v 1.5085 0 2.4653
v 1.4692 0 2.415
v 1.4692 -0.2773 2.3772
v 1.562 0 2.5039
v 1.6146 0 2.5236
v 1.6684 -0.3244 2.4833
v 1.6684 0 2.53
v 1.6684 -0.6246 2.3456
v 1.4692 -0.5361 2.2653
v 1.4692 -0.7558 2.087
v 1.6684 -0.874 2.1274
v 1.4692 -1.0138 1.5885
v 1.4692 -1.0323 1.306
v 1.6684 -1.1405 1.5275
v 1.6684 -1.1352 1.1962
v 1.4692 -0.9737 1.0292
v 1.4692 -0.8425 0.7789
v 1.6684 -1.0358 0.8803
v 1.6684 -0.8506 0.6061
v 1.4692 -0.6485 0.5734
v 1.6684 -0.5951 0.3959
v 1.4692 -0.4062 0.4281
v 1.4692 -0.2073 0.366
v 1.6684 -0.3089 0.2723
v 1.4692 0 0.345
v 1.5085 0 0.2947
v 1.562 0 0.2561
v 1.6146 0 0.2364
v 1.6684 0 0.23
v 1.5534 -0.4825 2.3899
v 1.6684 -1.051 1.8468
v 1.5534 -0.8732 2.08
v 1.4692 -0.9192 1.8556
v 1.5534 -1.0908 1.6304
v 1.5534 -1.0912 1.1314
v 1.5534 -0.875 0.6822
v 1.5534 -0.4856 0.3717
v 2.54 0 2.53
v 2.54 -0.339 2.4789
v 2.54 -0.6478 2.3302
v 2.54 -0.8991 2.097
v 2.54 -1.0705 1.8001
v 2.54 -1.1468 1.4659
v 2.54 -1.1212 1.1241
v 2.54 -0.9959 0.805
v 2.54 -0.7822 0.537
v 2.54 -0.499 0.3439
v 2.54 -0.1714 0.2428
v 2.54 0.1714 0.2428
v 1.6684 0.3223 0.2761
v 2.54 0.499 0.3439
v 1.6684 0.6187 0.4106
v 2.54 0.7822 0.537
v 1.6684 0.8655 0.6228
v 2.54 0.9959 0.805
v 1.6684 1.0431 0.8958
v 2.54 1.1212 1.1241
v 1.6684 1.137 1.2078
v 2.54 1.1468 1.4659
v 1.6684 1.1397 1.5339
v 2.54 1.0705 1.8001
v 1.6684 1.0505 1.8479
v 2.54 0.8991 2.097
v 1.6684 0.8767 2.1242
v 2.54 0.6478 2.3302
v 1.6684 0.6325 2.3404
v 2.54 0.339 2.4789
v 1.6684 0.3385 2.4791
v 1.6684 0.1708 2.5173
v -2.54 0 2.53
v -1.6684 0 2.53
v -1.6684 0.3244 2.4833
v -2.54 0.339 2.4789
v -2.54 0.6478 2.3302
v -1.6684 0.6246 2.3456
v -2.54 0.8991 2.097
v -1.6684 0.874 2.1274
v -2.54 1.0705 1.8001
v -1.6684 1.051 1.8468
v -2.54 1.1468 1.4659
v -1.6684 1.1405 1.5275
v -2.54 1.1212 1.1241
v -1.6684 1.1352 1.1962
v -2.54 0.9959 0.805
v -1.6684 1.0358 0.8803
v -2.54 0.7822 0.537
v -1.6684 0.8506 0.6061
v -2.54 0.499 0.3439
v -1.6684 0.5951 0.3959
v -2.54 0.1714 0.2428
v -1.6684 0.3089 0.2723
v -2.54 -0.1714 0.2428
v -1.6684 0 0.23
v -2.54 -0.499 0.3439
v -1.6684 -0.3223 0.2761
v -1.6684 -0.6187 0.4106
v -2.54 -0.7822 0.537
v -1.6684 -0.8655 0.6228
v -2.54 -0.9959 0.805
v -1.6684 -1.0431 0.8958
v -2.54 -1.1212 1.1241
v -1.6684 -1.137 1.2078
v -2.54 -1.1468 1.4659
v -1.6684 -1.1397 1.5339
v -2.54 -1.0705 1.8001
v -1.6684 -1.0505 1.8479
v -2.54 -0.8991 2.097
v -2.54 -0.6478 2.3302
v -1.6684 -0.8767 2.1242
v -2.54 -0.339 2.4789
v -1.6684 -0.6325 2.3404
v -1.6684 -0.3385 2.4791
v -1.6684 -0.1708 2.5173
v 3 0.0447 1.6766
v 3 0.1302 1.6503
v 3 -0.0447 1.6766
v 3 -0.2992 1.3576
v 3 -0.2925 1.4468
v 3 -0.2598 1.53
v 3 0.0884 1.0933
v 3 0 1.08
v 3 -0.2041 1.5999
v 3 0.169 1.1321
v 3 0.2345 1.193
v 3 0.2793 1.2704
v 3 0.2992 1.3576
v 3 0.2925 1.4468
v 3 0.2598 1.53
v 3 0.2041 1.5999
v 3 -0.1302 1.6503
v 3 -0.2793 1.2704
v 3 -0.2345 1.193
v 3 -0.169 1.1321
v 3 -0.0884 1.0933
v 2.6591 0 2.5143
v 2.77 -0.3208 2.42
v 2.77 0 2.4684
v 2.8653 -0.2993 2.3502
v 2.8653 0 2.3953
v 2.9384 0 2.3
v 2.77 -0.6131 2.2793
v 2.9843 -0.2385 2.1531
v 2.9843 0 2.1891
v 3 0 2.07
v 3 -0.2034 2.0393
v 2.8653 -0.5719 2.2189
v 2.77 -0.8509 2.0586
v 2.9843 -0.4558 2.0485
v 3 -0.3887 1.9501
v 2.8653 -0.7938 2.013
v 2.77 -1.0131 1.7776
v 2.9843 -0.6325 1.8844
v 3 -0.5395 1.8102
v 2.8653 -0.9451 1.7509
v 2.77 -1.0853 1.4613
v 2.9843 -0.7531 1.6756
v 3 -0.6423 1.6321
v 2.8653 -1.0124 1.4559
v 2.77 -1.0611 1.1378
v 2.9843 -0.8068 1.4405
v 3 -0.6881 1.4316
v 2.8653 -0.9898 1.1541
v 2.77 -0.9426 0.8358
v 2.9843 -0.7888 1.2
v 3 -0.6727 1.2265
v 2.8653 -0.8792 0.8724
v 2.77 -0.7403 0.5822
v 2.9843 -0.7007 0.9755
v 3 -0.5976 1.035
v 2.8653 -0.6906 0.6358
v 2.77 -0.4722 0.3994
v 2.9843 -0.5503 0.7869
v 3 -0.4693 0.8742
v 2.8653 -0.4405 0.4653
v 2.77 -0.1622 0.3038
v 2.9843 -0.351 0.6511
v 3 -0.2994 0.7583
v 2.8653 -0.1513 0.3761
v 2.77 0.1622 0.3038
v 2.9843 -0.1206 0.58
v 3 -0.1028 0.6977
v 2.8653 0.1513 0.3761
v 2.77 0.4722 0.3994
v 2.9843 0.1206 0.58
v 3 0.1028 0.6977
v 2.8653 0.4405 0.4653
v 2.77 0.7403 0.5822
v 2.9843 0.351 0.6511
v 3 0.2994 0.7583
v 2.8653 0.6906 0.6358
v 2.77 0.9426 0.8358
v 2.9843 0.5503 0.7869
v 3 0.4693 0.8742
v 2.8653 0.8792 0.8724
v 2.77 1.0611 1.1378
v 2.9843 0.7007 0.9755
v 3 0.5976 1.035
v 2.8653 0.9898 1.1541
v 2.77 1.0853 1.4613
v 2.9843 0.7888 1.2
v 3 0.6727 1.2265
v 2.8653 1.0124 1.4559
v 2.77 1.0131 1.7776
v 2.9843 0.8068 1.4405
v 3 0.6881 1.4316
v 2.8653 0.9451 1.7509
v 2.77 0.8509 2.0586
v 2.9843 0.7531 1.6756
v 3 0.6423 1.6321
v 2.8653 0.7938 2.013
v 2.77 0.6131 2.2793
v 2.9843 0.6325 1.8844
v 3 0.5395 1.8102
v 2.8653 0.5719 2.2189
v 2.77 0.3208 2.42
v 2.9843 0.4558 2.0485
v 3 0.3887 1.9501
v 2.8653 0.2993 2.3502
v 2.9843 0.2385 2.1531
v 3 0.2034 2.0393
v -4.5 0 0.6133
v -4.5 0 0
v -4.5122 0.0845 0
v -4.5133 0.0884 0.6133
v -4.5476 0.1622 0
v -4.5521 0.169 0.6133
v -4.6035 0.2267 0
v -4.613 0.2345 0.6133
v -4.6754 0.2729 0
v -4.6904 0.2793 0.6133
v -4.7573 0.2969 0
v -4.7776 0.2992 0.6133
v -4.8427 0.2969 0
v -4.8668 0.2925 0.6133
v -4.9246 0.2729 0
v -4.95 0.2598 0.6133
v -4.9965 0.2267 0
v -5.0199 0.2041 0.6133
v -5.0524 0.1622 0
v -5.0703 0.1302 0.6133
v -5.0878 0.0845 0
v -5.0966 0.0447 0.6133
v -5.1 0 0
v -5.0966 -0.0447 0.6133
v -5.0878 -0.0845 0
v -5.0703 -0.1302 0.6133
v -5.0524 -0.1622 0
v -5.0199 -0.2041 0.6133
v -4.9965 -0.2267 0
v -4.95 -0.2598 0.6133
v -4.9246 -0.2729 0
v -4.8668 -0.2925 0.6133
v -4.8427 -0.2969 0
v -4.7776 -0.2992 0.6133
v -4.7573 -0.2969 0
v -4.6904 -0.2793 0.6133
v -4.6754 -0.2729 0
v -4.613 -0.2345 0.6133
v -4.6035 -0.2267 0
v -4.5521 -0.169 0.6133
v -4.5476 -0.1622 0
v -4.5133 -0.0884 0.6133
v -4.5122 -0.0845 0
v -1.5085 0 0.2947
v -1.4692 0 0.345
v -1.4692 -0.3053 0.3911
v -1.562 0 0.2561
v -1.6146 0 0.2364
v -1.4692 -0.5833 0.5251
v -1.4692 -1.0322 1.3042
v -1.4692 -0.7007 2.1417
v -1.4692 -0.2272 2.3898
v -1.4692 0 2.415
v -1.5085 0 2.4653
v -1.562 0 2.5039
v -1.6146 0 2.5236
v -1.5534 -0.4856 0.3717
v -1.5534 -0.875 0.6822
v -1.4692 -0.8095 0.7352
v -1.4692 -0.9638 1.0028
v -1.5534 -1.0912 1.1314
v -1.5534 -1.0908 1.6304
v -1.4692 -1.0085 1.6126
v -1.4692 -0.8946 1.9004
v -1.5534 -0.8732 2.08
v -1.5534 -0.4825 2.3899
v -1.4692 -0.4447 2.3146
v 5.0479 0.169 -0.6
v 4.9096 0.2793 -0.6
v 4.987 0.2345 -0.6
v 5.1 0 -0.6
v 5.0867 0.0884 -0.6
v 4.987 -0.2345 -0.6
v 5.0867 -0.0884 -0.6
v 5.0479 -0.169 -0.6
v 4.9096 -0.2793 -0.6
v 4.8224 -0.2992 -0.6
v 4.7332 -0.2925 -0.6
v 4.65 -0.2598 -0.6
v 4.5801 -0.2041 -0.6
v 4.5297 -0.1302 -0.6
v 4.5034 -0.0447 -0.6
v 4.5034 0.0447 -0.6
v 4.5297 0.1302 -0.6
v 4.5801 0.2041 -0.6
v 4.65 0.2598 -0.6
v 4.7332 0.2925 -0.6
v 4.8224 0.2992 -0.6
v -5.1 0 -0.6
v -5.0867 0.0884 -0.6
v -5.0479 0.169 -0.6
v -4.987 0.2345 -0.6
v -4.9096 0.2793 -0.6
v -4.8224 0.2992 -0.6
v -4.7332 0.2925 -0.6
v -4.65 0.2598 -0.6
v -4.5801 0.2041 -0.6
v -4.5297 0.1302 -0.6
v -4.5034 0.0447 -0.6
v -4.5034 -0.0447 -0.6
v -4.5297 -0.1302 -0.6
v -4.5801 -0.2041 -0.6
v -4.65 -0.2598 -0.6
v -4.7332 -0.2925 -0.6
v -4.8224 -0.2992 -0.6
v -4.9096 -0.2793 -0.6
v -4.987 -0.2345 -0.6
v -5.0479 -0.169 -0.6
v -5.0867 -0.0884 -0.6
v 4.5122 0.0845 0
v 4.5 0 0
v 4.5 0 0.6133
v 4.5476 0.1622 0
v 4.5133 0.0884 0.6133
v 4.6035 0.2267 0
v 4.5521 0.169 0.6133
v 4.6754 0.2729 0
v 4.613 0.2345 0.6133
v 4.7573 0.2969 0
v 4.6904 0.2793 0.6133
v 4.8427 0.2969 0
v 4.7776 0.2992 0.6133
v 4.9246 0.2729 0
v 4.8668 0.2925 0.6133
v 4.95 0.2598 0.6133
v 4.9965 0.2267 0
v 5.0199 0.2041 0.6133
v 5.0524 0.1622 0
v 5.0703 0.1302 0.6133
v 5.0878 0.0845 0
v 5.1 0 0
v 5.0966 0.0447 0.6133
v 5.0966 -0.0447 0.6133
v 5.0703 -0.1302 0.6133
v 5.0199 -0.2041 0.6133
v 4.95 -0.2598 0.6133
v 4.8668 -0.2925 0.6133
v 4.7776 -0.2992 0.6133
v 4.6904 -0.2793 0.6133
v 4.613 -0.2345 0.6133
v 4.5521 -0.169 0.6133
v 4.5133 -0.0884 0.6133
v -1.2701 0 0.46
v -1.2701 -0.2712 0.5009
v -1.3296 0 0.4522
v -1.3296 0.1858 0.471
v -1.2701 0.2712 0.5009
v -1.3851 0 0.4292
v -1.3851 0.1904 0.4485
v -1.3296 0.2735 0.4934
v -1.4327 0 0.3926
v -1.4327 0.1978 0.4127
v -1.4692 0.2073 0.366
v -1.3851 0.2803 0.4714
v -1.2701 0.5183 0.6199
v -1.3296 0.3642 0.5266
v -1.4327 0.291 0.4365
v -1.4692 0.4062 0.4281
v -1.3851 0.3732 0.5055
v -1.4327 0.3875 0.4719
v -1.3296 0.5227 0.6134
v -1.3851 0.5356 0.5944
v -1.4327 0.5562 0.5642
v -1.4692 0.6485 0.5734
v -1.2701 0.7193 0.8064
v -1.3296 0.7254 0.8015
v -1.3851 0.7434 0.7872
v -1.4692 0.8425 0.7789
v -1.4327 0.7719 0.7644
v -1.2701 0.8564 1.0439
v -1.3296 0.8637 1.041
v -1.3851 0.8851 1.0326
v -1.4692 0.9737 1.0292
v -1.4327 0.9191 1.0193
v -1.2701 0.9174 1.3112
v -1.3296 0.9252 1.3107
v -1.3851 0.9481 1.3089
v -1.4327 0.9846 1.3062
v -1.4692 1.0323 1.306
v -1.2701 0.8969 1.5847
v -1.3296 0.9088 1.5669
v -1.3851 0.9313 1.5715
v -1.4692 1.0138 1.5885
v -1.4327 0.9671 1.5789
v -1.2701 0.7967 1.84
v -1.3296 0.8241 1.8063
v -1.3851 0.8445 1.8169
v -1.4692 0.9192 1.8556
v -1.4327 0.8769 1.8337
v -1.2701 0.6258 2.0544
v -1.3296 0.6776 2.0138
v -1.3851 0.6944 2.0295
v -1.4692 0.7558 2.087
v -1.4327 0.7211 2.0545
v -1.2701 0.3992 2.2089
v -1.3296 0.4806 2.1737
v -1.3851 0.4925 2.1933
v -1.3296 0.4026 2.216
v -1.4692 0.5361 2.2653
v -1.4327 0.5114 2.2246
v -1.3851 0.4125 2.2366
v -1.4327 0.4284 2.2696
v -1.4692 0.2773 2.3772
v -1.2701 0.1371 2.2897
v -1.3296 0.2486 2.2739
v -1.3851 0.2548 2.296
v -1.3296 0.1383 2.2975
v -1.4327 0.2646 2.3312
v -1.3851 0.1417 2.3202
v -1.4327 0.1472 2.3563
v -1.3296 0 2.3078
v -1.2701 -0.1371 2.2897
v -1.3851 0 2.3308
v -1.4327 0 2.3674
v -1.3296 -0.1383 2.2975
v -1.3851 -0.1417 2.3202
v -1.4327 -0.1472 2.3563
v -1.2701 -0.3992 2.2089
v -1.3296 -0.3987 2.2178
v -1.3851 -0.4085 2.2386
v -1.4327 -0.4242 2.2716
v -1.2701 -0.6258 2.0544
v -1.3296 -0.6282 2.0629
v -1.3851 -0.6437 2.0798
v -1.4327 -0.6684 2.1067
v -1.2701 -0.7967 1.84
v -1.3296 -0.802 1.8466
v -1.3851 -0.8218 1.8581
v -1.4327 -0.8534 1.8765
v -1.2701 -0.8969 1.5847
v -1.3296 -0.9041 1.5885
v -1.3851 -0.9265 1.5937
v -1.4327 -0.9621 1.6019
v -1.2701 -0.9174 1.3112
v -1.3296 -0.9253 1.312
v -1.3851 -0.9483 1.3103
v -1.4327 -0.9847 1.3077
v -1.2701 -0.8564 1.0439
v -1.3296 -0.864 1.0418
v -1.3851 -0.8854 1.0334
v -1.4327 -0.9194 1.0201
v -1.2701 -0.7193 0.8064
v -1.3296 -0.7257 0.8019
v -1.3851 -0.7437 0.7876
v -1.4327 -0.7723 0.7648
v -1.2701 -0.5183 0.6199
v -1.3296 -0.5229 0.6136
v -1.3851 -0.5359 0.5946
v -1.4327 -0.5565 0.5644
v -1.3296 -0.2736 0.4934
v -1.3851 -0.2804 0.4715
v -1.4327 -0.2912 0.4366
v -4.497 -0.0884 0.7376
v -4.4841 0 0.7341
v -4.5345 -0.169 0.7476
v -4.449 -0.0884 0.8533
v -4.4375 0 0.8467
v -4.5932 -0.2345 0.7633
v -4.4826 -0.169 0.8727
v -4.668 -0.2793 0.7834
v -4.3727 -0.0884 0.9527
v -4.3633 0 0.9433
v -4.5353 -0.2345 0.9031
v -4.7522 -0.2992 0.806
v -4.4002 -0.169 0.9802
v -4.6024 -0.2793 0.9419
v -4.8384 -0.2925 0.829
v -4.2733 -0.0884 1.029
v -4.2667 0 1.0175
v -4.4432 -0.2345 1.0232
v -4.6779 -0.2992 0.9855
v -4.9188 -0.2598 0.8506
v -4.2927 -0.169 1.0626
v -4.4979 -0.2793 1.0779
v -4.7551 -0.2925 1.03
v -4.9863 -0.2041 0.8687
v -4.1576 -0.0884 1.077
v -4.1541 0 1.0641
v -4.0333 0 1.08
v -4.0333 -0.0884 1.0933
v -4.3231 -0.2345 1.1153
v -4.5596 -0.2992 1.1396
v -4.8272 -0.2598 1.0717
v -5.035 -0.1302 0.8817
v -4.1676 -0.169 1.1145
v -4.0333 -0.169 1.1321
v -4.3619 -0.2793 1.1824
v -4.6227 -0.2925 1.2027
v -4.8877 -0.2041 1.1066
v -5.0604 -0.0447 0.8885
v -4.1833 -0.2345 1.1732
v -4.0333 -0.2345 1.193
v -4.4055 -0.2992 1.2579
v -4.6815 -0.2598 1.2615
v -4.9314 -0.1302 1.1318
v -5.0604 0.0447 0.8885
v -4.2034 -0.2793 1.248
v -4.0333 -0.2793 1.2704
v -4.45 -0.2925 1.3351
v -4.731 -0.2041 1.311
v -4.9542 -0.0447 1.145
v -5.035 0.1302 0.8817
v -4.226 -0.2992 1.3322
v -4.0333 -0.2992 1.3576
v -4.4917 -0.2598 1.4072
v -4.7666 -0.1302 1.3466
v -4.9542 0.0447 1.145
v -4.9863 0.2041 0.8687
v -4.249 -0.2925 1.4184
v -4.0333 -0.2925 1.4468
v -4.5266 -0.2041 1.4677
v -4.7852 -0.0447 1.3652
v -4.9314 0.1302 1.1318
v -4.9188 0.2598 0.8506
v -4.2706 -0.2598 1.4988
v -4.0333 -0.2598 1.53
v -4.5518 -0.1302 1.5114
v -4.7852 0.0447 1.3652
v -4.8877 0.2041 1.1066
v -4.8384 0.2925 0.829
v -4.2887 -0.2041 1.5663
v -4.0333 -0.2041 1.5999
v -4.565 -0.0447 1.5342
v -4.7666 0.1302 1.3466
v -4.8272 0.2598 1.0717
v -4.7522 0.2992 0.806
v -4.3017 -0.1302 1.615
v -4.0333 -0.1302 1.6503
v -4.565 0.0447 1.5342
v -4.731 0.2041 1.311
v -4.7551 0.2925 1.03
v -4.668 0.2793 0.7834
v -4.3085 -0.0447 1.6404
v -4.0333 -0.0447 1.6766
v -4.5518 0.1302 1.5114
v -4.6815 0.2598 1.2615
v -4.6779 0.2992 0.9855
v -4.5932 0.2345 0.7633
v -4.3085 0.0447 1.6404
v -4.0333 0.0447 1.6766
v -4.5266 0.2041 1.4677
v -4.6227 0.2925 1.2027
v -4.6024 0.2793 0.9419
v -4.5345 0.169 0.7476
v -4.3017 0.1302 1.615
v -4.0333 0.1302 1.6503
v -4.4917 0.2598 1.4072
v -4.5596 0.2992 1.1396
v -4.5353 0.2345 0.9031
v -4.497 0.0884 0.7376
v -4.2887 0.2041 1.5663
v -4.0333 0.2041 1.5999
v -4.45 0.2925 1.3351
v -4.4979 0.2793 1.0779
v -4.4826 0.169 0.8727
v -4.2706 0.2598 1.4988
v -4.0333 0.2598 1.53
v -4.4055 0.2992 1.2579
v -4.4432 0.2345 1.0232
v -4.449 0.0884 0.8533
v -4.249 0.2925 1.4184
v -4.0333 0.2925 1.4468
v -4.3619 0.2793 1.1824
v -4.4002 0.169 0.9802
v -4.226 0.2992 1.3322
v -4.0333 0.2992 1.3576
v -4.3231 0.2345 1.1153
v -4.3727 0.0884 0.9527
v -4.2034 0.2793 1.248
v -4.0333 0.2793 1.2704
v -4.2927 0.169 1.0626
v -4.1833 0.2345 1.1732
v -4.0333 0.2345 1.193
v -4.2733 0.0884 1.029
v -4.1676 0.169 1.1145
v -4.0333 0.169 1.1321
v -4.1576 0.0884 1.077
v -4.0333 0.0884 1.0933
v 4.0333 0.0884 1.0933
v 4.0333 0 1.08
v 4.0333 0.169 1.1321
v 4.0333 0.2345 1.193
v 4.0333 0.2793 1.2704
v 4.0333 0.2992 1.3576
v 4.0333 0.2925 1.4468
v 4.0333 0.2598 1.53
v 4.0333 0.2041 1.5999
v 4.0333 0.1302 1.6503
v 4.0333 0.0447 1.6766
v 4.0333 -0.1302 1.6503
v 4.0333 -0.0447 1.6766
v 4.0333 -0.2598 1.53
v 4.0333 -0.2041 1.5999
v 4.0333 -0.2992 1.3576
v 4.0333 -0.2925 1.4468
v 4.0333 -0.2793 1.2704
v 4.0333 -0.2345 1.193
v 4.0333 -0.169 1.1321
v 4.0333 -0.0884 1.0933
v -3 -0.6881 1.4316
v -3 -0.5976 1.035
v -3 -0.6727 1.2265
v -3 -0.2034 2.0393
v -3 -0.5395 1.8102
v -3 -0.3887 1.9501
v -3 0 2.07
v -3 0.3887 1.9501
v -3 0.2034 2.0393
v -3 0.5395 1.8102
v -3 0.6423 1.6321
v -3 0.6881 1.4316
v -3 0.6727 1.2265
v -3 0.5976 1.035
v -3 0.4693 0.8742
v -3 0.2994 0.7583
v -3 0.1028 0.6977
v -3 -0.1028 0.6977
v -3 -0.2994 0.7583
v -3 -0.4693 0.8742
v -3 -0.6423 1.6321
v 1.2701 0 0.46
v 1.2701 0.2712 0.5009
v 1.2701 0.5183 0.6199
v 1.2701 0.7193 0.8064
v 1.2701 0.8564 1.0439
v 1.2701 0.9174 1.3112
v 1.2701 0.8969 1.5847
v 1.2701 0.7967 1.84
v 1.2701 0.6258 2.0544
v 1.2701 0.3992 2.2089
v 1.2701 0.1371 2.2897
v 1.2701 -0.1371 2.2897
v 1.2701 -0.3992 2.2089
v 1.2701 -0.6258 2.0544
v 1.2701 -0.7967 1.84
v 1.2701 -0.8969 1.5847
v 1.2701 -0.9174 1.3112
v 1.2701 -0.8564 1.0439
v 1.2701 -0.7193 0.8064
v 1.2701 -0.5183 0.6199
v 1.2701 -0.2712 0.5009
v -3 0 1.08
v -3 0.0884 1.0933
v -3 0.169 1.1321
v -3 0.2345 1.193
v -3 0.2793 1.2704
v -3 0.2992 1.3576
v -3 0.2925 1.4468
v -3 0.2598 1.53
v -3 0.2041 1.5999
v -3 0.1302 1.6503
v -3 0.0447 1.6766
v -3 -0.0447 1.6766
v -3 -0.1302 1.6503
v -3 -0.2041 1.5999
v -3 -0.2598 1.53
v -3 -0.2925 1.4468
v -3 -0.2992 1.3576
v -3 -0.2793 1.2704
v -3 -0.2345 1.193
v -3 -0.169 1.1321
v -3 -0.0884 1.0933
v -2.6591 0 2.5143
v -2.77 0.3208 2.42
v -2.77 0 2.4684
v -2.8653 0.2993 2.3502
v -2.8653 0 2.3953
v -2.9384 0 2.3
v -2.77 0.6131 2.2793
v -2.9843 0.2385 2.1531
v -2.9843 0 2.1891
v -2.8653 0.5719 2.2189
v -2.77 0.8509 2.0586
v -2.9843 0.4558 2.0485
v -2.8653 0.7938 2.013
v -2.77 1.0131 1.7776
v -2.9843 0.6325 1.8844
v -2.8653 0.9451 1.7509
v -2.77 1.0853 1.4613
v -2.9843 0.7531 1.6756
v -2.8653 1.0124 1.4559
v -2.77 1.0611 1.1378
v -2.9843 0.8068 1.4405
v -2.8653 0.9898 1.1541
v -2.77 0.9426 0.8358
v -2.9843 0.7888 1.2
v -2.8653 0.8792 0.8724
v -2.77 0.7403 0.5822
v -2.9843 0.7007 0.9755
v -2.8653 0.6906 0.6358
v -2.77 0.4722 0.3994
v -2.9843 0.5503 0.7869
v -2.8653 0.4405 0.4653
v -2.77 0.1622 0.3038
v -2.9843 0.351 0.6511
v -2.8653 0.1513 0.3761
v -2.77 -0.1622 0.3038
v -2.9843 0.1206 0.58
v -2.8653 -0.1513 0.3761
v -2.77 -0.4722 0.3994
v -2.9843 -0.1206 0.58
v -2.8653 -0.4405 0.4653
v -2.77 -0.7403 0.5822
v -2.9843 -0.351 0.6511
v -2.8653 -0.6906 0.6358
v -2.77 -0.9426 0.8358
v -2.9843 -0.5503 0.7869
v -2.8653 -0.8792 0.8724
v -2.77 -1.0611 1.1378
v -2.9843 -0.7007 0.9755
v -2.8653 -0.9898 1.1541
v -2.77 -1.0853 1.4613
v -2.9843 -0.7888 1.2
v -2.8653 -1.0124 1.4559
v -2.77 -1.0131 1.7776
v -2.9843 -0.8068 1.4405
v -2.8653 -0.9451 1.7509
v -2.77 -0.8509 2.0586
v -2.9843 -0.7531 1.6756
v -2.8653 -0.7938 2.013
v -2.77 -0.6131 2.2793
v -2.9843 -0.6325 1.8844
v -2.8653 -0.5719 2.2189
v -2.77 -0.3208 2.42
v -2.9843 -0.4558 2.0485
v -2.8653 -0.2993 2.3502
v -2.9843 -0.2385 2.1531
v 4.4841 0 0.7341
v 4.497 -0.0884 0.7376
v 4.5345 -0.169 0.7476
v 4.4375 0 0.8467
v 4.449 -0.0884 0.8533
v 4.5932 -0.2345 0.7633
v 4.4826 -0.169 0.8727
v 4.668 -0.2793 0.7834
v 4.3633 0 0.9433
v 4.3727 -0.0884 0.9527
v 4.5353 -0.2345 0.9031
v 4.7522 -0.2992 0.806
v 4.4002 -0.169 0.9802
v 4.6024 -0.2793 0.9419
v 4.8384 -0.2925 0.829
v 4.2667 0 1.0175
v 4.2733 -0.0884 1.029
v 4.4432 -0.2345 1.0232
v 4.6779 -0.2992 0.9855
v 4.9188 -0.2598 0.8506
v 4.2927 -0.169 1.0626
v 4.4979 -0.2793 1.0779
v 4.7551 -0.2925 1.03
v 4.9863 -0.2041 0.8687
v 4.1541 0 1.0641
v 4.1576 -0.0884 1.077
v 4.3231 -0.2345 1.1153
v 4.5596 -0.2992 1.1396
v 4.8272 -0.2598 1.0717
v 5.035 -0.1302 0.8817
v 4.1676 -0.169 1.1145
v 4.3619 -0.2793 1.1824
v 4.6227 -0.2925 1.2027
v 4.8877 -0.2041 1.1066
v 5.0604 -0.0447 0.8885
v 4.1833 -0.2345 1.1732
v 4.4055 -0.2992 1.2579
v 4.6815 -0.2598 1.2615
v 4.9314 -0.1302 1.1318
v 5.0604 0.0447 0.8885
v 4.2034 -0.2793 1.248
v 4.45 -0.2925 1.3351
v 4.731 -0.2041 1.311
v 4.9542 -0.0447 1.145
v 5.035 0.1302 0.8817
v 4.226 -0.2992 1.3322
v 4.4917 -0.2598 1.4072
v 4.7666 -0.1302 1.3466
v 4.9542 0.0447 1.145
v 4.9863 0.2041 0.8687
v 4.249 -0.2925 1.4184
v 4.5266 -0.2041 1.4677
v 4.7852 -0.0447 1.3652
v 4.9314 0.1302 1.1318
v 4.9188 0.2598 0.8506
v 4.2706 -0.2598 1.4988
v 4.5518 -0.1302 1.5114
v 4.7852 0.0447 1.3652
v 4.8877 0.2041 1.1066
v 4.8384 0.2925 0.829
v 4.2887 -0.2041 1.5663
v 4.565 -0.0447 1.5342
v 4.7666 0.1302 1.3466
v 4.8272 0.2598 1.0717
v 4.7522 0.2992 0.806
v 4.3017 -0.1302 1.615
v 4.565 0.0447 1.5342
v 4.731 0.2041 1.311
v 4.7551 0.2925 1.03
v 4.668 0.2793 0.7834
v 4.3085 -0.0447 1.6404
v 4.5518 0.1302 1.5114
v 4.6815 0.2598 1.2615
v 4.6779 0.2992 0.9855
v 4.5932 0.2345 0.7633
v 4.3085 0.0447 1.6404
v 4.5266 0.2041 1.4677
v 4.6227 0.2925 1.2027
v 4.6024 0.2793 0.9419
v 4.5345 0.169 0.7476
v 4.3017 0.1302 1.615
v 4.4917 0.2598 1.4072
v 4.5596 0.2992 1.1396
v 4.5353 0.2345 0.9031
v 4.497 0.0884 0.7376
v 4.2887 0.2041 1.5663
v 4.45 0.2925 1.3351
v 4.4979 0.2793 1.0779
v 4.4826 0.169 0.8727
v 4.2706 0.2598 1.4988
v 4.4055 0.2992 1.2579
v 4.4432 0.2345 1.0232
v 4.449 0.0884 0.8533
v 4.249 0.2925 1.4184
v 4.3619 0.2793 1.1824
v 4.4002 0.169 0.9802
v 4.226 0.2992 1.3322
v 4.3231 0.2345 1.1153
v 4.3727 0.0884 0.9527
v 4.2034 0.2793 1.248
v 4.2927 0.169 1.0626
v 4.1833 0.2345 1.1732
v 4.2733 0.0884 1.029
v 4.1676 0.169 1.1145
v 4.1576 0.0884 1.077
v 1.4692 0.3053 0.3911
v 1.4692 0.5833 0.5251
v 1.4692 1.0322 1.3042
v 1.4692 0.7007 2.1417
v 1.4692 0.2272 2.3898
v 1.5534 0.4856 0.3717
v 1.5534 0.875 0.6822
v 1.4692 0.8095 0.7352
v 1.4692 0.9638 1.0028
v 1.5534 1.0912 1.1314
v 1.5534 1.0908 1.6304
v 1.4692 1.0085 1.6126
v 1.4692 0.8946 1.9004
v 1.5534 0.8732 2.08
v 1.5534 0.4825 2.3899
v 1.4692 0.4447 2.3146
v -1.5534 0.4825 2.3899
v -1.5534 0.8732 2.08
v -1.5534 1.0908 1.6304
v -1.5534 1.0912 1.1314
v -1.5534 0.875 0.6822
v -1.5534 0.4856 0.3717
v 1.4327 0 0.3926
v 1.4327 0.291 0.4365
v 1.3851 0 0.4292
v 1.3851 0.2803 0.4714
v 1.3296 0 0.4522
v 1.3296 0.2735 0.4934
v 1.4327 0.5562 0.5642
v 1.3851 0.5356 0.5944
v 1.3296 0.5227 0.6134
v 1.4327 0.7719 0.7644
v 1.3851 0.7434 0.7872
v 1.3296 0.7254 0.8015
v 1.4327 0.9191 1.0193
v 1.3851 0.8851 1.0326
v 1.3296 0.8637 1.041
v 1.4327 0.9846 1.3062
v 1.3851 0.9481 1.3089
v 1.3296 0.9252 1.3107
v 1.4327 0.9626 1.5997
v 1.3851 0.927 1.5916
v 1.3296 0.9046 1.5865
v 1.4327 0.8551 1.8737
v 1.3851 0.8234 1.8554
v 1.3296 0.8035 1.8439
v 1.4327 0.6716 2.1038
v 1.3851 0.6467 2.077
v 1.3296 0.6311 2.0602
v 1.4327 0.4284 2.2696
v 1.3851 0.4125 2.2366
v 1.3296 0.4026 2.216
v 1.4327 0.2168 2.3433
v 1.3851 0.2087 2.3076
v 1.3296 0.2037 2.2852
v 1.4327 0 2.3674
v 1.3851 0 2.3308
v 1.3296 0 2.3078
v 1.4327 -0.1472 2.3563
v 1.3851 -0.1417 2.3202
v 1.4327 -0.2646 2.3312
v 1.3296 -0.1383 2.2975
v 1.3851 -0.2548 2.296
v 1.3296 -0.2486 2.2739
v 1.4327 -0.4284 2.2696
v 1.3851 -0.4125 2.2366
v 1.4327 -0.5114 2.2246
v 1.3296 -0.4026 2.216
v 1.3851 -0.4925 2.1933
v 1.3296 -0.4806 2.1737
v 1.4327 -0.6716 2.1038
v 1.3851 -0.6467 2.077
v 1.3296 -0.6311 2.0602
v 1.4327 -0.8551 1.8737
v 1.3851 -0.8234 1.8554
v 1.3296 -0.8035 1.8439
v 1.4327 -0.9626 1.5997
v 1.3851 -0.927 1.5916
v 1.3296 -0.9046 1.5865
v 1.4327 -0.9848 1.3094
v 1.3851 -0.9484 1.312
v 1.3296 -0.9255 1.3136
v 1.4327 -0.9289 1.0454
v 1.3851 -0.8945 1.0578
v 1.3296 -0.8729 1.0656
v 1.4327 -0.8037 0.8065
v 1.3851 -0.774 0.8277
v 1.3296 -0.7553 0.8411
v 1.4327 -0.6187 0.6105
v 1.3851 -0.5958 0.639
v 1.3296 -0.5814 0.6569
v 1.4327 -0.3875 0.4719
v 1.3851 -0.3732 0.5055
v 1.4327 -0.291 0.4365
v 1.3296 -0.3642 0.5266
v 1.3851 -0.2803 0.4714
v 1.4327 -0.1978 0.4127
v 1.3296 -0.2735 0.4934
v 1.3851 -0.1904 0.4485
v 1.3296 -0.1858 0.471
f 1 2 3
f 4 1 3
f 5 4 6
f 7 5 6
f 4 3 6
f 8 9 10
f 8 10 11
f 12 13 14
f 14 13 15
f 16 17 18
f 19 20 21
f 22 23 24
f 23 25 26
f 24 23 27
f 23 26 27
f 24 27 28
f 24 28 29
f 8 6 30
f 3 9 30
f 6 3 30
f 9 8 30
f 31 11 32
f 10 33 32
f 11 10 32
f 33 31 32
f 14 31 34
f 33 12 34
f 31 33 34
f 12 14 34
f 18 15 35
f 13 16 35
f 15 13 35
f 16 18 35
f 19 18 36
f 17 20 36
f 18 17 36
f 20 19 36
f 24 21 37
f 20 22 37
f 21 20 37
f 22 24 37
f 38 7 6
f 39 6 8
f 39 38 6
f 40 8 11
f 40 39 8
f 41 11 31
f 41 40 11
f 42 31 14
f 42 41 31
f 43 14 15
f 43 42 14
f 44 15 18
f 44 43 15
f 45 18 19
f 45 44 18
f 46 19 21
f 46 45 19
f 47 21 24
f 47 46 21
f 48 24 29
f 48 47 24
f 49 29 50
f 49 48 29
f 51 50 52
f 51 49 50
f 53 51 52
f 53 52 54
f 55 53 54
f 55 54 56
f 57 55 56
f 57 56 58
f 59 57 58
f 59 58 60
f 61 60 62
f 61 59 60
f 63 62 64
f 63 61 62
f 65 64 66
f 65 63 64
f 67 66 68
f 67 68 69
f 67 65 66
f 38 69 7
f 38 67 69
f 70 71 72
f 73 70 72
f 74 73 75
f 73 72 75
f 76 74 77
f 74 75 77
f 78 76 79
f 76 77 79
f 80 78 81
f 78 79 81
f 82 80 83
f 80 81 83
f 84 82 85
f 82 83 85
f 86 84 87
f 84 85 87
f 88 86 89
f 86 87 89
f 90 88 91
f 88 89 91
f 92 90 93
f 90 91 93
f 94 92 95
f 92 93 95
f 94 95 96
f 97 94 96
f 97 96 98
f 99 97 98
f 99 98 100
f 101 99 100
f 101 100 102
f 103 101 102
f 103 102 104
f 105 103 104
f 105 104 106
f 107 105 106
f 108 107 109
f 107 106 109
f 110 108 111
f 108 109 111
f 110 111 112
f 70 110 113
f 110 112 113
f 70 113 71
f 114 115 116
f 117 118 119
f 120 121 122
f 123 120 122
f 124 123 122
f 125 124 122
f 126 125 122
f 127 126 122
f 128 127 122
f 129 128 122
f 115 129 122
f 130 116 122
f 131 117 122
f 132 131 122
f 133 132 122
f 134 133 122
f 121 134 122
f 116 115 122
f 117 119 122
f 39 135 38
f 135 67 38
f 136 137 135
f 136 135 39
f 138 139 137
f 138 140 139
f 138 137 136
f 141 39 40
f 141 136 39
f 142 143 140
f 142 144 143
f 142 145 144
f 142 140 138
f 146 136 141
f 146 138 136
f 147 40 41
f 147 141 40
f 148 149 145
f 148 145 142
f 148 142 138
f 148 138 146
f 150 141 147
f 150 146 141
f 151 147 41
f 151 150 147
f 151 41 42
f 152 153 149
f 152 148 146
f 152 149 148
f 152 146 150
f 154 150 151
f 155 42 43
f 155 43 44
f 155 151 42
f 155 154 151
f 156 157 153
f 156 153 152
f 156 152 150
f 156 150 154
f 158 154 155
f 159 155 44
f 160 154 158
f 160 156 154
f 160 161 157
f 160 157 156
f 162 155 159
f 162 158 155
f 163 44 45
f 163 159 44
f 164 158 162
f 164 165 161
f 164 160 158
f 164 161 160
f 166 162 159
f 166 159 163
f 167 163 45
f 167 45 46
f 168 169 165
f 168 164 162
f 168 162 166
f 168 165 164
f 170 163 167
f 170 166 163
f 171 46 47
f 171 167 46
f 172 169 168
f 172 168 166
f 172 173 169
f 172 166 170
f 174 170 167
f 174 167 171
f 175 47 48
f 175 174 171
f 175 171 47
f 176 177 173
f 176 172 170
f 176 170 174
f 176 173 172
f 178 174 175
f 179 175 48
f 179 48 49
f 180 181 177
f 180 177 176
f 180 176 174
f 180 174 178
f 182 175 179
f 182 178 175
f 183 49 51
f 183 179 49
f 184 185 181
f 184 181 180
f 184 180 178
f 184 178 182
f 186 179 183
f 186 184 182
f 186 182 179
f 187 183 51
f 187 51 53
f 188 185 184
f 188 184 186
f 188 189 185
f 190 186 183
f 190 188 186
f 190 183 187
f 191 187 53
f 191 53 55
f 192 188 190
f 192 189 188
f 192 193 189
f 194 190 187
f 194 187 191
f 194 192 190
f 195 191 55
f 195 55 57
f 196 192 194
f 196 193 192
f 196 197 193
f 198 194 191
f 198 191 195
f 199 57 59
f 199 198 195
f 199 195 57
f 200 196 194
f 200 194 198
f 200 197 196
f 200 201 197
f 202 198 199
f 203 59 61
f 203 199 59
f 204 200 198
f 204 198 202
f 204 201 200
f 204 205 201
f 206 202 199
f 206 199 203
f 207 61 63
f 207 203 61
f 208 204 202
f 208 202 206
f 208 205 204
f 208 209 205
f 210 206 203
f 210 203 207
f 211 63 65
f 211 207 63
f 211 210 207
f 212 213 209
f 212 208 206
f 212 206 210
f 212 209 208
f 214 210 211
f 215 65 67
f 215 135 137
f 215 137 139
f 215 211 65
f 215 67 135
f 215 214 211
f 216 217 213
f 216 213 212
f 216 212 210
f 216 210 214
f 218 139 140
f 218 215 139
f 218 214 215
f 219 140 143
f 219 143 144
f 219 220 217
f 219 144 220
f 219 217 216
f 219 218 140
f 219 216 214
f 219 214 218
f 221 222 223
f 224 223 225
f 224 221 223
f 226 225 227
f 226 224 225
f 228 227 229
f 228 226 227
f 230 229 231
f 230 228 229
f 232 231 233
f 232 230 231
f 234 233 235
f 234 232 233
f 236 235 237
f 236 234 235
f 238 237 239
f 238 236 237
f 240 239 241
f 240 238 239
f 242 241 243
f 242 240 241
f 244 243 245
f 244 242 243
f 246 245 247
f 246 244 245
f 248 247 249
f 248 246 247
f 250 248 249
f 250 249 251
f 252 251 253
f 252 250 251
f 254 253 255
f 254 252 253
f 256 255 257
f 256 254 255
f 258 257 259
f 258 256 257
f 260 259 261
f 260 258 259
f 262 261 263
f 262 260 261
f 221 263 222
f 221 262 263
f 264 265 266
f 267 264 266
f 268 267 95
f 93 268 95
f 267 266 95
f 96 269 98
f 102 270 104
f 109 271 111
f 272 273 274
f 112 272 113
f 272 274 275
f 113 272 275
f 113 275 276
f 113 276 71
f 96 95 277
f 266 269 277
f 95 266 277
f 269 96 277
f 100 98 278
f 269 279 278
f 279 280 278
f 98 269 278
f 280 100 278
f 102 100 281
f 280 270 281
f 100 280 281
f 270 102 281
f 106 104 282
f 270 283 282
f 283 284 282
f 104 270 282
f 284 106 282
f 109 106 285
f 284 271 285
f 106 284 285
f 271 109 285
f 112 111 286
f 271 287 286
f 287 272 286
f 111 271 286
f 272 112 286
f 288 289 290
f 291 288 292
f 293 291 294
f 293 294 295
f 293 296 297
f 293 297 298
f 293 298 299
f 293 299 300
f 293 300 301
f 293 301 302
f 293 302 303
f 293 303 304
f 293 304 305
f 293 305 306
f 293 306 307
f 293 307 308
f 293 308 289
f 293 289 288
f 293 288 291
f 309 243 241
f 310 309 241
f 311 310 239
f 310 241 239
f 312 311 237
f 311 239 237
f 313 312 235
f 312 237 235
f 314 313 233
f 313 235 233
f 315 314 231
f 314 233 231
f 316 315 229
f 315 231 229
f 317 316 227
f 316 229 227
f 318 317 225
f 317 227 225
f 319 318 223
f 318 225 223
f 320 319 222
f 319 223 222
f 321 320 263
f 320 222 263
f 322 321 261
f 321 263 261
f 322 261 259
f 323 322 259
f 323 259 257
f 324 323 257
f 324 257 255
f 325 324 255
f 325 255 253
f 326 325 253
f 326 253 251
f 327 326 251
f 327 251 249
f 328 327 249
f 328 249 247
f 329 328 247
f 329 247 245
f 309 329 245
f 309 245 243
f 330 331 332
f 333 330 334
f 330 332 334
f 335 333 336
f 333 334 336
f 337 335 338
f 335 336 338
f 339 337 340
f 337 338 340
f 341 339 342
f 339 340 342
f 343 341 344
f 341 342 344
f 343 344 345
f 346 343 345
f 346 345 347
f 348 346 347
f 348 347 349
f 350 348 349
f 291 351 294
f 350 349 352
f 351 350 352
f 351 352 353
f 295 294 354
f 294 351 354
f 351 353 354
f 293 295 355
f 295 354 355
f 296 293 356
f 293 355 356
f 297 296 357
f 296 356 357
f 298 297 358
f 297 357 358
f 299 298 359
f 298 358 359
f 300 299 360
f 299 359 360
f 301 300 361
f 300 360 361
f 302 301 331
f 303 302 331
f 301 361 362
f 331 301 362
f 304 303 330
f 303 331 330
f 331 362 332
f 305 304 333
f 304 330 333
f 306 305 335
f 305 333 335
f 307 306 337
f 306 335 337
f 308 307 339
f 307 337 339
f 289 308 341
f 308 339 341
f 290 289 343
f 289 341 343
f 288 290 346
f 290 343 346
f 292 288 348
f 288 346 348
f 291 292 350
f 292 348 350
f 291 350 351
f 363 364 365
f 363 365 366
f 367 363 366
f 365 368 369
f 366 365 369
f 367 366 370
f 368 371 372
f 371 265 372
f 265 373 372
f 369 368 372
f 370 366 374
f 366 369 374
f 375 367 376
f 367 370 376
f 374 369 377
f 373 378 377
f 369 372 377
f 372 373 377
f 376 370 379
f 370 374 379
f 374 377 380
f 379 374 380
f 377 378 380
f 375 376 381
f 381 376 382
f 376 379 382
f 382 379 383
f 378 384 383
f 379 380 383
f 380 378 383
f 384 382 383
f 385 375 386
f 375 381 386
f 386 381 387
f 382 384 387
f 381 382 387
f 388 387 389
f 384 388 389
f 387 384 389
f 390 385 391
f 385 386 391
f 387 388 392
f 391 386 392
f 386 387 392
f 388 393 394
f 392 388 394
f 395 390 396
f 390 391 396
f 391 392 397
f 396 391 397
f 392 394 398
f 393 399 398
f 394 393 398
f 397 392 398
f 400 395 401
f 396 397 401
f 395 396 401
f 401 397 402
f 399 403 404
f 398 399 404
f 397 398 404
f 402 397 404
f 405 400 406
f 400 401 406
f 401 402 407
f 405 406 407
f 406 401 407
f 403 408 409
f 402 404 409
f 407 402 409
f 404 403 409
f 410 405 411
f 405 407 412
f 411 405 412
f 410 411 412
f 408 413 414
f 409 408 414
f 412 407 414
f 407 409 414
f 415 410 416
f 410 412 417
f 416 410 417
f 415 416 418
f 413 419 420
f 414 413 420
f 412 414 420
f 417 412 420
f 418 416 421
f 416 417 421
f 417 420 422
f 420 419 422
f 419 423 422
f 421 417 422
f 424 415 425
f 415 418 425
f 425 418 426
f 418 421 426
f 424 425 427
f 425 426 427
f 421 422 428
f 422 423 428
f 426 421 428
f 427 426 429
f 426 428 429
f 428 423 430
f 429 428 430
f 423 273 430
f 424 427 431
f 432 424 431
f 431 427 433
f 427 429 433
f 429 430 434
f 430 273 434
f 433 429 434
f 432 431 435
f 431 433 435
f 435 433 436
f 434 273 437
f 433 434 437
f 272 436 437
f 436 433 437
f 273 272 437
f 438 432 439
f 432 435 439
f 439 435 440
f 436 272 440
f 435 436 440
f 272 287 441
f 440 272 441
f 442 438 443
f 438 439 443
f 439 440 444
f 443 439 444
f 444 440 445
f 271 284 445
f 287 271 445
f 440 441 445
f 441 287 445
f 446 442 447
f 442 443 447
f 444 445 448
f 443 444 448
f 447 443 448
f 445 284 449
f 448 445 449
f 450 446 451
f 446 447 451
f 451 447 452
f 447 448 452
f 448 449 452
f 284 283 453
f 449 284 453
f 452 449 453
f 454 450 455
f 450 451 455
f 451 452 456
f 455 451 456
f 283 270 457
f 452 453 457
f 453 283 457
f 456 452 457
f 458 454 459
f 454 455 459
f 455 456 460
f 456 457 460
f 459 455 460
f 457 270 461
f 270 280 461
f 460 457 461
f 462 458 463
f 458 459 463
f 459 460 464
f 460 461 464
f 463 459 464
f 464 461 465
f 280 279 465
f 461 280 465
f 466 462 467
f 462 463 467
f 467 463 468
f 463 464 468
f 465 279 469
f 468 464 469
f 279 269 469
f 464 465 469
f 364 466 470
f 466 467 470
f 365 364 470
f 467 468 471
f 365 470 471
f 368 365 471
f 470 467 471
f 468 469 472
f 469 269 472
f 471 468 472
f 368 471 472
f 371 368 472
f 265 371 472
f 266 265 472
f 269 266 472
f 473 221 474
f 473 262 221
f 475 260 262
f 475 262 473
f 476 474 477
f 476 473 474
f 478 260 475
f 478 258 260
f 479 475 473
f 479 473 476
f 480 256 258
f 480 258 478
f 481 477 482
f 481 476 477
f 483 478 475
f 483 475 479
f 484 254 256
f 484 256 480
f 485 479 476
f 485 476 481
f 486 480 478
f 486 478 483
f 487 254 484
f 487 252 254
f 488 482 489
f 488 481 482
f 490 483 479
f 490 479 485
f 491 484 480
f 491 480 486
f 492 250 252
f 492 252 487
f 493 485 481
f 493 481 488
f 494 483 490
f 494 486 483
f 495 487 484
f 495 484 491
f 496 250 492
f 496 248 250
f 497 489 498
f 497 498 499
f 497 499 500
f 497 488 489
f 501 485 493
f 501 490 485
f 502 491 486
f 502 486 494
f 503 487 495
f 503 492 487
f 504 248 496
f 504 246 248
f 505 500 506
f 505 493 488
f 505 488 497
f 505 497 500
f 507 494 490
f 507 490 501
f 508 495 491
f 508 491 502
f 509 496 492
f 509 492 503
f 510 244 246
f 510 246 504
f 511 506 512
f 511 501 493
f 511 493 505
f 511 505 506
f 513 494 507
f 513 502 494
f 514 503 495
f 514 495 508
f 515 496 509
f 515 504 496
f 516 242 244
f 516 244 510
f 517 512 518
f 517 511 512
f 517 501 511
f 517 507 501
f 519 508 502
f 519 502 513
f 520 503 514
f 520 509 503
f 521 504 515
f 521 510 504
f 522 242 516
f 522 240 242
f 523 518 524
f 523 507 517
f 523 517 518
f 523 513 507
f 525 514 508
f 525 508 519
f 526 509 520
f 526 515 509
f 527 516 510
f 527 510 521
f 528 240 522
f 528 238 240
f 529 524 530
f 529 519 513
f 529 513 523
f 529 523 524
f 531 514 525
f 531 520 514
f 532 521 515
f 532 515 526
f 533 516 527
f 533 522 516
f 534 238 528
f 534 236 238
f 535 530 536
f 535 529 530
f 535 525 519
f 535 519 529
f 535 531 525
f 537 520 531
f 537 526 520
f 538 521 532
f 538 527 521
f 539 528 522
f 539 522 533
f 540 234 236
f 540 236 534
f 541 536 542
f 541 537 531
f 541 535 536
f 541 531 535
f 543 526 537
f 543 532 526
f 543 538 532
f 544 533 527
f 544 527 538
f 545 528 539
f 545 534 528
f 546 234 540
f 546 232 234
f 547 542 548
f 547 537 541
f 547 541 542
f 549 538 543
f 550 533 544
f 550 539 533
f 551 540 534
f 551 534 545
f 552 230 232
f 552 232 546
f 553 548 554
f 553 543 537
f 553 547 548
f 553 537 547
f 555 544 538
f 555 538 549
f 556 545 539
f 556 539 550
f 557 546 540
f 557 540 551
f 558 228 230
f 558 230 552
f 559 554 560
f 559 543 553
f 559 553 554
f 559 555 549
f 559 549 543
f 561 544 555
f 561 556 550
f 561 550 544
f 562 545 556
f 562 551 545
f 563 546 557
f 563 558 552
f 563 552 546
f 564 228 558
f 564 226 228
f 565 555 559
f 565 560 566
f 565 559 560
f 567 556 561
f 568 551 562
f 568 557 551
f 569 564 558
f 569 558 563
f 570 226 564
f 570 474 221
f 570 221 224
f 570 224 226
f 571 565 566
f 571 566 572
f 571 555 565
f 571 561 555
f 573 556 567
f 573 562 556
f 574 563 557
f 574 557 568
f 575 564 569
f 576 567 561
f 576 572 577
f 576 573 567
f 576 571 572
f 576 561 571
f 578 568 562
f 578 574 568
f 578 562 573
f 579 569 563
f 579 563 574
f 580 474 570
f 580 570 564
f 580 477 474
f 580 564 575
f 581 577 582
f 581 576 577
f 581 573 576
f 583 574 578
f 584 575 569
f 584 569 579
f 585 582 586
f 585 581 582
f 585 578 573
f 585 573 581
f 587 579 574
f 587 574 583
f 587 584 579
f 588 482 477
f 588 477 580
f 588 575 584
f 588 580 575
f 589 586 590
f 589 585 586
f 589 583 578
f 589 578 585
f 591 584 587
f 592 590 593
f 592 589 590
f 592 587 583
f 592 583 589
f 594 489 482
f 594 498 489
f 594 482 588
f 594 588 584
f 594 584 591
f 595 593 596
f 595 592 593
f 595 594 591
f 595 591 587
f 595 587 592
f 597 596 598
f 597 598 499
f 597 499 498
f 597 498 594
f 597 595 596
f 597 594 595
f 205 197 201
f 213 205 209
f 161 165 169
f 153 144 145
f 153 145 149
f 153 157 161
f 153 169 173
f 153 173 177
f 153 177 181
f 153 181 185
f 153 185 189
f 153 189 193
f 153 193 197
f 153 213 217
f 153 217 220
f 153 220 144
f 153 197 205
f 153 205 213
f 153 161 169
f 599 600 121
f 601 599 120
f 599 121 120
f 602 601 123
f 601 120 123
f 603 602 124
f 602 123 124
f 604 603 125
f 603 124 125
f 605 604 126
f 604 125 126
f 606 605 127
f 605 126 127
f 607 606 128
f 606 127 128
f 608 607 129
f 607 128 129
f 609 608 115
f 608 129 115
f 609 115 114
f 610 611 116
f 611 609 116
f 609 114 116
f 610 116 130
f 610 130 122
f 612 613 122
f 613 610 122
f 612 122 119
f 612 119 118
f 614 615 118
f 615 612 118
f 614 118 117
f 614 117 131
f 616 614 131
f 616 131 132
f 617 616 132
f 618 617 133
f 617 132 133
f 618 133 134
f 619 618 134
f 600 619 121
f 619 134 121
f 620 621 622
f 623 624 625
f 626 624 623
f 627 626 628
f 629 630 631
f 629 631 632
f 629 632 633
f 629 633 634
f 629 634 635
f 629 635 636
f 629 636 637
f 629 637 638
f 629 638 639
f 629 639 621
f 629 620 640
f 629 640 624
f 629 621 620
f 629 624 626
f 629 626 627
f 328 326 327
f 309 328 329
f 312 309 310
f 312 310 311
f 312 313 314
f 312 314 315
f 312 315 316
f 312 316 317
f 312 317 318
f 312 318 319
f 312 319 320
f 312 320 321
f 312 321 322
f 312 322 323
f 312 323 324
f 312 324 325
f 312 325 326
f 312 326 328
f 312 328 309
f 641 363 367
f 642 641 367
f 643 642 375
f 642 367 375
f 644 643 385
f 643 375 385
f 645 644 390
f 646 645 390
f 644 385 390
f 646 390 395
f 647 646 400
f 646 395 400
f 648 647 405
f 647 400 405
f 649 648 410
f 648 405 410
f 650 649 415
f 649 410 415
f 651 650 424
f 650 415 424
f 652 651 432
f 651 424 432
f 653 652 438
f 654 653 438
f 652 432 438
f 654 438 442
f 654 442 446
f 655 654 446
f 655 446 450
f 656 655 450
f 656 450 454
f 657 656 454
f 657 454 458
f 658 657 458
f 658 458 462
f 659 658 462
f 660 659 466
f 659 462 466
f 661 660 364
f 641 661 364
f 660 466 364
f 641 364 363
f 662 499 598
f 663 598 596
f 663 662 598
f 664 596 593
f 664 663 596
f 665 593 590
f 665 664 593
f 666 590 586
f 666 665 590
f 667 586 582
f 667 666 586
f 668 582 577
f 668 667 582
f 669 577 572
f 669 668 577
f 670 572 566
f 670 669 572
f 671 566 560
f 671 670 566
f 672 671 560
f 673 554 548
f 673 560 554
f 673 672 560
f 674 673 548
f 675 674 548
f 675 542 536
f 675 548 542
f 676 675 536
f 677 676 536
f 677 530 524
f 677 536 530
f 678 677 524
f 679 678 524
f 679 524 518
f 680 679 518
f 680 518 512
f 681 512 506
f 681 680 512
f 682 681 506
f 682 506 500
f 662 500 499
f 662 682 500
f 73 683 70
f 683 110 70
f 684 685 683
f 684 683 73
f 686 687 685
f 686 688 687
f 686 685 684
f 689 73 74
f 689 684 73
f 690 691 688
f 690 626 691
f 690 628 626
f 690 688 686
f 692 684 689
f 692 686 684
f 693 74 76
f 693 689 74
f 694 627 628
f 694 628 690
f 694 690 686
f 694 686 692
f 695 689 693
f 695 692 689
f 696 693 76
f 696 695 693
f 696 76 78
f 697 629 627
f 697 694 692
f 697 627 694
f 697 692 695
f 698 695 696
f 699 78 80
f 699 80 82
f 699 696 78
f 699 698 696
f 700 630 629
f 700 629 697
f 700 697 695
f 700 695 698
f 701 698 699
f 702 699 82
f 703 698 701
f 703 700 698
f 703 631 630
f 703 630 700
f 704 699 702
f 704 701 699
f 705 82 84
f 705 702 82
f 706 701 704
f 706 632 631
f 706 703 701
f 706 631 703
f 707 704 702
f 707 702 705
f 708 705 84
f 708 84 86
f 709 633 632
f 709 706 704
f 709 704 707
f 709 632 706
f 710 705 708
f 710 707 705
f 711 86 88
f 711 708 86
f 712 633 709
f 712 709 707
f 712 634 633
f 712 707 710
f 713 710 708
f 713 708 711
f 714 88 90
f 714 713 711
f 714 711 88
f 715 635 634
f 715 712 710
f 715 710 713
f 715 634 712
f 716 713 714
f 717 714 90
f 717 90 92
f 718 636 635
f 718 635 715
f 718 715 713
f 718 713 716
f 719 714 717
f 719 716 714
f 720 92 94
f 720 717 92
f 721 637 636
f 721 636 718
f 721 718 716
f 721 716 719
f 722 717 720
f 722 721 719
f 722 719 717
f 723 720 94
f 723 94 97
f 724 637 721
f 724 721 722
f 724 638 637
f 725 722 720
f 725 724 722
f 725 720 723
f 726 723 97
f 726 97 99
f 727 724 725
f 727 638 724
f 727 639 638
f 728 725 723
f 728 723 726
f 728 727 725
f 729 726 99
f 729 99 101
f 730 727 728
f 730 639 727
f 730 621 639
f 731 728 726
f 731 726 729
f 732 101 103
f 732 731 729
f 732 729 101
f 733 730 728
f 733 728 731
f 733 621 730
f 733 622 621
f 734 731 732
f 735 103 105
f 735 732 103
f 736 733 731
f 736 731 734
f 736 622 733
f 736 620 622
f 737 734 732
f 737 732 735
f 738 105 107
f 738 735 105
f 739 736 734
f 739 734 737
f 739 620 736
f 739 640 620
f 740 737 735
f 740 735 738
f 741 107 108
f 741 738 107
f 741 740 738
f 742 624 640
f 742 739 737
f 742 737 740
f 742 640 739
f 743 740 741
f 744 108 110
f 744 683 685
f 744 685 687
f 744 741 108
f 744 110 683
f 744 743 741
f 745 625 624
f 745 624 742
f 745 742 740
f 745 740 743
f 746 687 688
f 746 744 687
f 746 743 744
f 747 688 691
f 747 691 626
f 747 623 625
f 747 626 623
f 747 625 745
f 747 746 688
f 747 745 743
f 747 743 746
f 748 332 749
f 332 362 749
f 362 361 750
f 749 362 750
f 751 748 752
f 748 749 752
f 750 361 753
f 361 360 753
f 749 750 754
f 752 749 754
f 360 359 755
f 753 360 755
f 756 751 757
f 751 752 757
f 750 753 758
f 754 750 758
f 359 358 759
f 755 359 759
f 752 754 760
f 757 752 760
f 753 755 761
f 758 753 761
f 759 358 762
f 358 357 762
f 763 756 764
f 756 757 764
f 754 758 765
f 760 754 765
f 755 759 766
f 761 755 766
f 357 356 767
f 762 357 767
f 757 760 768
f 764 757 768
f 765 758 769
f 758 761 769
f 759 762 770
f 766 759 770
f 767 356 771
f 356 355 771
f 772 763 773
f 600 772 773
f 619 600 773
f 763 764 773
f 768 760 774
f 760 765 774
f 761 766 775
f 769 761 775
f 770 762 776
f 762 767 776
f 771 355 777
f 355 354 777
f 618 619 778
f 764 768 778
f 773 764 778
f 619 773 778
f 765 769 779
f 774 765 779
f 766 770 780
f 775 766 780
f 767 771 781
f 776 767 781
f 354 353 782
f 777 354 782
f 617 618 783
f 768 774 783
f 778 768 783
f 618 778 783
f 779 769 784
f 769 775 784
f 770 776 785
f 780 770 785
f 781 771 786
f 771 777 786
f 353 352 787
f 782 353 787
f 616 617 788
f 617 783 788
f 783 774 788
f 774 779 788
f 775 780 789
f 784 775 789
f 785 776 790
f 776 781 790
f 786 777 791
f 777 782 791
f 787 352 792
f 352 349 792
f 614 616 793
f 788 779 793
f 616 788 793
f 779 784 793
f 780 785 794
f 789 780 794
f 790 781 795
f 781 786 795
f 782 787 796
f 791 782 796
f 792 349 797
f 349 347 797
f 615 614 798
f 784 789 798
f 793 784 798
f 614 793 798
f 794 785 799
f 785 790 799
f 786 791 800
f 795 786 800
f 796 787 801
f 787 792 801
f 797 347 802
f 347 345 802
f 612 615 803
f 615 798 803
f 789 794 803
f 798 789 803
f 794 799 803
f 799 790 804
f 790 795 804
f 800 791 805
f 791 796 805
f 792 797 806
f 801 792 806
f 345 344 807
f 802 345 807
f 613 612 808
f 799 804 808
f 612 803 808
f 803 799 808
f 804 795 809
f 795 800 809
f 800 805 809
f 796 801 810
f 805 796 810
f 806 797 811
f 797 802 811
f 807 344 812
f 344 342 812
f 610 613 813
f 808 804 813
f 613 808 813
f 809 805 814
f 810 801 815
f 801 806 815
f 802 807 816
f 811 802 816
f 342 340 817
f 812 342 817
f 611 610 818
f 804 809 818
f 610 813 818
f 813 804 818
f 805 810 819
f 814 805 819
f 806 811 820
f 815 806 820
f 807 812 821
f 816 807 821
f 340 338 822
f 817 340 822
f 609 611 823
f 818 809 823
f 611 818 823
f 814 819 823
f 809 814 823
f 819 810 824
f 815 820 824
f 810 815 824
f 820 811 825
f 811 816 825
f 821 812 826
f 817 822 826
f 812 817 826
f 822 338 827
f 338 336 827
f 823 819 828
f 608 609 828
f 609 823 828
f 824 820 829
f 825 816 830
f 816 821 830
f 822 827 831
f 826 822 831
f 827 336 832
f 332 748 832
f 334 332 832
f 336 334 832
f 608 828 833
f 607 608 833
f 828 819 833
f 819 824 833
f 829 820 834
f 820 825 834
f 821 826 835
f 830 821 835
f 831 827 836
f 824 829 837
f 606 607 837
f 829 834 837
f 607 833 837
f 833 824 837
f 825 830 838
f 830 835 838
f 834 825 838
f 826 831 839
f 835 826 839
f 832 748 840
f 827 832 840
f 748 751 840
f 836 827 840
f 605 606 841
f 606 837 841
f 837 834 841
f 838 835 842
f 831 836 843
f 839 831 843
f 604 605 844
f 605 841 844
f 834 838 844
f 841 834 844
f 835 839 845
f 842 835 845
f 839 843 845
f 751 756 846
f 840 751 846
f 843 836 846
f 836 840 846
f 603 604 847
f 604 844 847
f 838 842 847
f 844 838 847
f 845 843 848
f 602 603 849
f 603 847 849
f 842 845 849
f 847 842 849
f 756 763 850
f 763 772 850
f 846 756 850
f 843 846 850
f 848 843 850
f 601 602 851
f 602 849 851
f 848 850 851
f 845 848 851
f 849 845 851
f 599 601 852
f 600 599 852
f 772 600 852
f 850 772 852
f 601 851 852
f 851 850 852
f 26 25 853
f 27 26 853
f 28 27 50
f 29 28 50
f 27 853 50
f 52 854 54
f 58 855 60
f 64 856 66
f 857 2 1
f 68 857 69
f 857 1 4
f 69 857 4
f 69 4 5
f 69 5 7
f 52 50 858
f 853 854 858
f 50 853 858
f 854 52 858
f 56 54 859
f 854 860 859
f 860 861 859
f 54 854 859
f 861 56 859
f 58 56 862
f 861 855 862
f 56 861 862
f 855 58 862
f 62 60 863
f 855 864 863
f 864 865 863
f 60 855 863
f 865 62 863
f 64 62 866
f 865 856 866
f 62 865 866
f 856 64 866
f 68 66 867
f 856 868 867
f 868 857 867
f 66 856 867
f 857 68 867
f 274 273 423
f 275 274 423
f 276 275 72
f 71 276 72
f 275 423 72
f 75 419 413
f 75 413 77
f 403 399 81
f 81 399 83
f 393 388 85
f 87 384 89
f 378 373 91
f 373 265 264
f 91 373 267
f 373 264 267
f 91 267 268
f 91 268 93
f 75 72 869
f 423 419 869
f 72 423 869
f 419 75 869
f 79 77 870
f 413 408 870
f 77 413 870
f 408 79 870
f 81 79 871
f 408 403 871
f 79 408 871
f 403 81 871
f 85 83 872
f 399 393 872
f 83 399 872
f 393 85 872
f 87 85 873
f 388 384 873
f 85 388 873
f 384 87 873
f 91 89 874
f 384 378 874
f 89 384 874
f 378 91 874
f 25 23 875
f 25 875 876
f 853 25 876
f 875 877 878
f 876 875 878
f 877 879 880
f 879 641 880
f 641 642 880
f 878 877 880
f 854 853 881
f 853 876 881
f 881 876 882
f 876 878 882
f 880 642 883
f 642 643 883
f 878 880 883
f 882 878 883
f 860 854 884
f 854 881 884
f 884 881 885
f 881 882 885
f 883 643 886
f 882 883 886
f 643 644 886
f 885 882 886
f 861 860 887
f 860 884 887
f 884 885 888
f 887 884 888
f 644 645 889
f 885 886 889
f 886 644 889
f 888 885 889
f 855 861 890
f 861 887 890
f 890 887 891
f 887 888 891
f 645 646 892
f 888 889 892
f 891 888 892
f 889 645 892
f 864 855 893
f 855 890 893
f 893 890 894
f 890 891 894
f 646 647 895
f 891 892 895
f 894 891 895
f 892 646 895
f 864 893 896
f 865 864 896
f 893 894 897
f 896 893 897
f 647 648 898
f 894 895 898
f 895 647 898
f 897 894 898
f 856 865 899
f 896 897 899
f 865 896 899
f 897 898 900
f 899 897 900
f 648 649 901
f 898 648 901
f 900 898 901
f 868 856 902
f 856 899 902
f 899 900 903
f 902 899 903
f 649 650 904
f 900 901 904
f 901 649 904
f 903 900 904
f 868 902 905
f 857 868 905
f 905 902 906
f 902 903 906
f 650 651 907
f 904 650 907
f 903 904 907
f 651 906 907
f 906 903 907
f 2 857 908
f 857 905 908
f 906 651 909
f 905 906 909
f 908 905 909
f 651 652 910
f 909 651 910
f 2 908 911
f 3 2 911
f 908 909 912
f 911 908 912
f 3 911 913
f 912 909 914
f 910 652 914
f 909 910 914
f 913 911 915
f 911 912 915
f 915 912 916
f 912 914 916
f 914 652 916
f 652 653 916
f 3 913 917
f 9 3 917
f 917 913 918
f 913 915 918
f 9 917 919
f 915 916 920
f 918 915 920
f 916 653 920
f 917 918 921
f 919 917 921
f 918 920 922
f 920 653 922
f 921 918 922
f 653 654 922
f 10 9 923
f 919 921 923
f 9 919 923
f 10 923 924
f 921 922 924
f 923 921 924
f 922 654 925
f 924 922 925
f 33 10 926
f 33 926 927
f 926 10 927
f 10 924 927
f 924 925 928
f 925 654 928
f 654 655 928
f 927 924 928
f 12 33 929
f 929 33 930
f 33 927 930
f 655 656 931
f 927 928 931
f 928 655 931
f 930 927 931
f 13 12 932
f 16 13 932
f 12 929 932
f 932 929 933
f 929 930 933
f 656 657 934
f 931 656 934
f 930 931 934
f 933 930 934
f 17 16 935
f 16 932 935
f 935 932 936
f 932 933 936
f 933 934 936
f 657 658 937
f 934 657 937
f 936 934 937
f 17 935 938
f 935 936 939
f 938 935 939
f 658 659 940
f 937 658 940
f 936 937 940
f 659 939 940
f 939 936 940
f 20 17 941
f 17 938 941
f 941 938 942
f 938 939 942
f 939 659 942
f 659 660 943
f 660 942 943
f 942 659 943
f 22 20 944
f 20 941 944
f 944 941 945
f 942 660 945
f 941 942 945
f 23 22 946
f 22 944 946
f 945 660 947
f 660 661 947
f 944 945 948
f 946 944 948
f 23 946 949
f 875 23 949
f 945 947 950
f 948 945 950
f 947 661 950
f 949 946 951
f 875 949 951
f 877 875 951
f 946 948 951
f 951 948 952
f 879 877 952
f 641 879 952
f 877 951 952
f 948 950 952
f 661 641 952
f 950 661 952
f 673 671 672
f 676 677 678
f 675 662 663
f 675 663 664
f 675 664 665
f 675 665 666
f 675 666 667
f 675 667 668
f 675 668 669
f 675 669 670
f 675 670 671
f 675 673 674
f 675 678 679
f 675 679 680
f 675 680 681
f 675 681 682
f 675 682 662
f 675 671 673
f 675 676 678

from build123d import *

# Parameters (mm, degrees)
EXTRUDE_START   = -1.5
SKETCH_3_R      = 0.92
EXTRUDE_1_DEPTH = 3
SKETCH_5_R      = 1.15
EXTRUDE_2_DEPTH = 1.5
EXTRUDE_START_2 = 1.5
SKETCH_7_R      = 1.15
EXTRUDE_3_DEPTH = 1.5
FILLET_1_R      = 0.46
FILLET_3_R      = 0.23
FILLET_4_R      = 0.23
SKETCH_1_R      = 0.3
SKETCH_32_R     = 0.3
EXTRUDE_4_DEPTH = 0.6


with BuildPart() as part:
    # Эскиз3 → Бобышка-Вытянуть1 (new body)
    with BuildSketch(Plane(origin=(0, 0, 0), x_dir=(0, 0, -1), z_dir=(1, 0, 0)).offset(EXTRUDE_START)):
        with Locations((-1.38, 0)):
            Circle(SKETCH_3_R)
    extrude(amount=EXTRUDE_1_DEPTH)

    # Эскиз5 → Бобышка-Вытянуть2 (add)
    with BuildSketch(Plane.ZY.offset(1.5)):
        with Locations((1.38, 0)):
            Circle(SKETCH_5_R)
    extrude(amount=EXTRUDE_2_DEPTH)

    # Эскиз7 → Бобышка-Вытянуть3 (add)
    with BuildSketch(Plane(origin=(1.5, 0, 0), x_dir=(0, 0, -1), z_dir=(1, 0, 0)).offset(EXTRUDE_START_2)):
        with Locations(Location((-1.38, 0, 0), (0, 0, 180))):
            Circle(SKETCH_7_R)
    extrude(amount=-EXTRUDE_3_DEPTH)

    # Скругление1
    fillet_1_edges = [part.edges().sort_by_distance(p)[0] for p in [
        (3, 0, 0.23),
        (-3, 0, 0.23),
    ]]
    fillet(fillet_1_edges, radius=FILLET_1_R)

    # Скругление3
    fillet_3_edges = [part.edges().sort_by_distance(p)[0] for p in [
        (1.5, 0, 2.3),
        (-1.5, 0, 2.3),
    ]]
    fillet(fillet_3_edges, radius=FILLET_3_R - 0.0001)  # a hair under: the kernel refuses the full size

    # Скругление4
    fillet_4_edges = [part.edges().sort_by_distance(p)[0] for p in [
        (-1.5, 0, 0.23),
        (1.5, 0, 0.23),
    ]]
    fillet(fillet_4_edges, radius=FILLET_4_R)


with BuildPart() as body_2:
    # По траектории8: sweep along a path in Эскиз10
    with BuildLine(Plane(origin=(0, 0, 0), x_dir=(1, 0, 0), z_dir=(0, 1, 0))) as sweep_8_path:
        Line((-4.8, 0), (-4.8, -0.613333333))
        ThreePointArc((-4.8, -0.613333333), (-4.575448532, -1.155448532), (-4.033333333, -1.38))
        Line((-4.033333333, -1.38), (-3, -1.38))
    # Эскиз1 → По траектории8 (sweep)
    with BuildSketch(Plane.XY):
        with Locations((-4.8, 0)):
            Circle(SKETCH_1_R)
    sweep(path=sweep_8_path.line)


with BuildPart() as body_3:
    # Зеркальное отражение1: mirrored copy
    add(body_2.part.mirror(Plane(origin=(0, 0, 0), x_dir=(0, 0, 1), z_dir=(1, 0, 0))))


with BuildPart() as body_2_1:
    add(body_2.part)

    add(body_3.part)  # Бобышка-Вытянуть4 merges body 3
    # Эскиз32 → Бобышка-Вытянуть4 (add)
    with BuildSketch(Plane(origin=(0, 0, 0), x_dir=(-1, 0, 0), z_dir=(0, 0, -1))):
        with Locations((4.8, 0)):
            Circle(SKETCH_32_R)
        with Locations(Location((-4.8, 0, 0), (0, 0, 180))):
            Circle(SKETCH_32_R)
    extrude(amount=EXTRUDE_4_DEPTH)


solid = Compound([part.part, body_2_1.part])
